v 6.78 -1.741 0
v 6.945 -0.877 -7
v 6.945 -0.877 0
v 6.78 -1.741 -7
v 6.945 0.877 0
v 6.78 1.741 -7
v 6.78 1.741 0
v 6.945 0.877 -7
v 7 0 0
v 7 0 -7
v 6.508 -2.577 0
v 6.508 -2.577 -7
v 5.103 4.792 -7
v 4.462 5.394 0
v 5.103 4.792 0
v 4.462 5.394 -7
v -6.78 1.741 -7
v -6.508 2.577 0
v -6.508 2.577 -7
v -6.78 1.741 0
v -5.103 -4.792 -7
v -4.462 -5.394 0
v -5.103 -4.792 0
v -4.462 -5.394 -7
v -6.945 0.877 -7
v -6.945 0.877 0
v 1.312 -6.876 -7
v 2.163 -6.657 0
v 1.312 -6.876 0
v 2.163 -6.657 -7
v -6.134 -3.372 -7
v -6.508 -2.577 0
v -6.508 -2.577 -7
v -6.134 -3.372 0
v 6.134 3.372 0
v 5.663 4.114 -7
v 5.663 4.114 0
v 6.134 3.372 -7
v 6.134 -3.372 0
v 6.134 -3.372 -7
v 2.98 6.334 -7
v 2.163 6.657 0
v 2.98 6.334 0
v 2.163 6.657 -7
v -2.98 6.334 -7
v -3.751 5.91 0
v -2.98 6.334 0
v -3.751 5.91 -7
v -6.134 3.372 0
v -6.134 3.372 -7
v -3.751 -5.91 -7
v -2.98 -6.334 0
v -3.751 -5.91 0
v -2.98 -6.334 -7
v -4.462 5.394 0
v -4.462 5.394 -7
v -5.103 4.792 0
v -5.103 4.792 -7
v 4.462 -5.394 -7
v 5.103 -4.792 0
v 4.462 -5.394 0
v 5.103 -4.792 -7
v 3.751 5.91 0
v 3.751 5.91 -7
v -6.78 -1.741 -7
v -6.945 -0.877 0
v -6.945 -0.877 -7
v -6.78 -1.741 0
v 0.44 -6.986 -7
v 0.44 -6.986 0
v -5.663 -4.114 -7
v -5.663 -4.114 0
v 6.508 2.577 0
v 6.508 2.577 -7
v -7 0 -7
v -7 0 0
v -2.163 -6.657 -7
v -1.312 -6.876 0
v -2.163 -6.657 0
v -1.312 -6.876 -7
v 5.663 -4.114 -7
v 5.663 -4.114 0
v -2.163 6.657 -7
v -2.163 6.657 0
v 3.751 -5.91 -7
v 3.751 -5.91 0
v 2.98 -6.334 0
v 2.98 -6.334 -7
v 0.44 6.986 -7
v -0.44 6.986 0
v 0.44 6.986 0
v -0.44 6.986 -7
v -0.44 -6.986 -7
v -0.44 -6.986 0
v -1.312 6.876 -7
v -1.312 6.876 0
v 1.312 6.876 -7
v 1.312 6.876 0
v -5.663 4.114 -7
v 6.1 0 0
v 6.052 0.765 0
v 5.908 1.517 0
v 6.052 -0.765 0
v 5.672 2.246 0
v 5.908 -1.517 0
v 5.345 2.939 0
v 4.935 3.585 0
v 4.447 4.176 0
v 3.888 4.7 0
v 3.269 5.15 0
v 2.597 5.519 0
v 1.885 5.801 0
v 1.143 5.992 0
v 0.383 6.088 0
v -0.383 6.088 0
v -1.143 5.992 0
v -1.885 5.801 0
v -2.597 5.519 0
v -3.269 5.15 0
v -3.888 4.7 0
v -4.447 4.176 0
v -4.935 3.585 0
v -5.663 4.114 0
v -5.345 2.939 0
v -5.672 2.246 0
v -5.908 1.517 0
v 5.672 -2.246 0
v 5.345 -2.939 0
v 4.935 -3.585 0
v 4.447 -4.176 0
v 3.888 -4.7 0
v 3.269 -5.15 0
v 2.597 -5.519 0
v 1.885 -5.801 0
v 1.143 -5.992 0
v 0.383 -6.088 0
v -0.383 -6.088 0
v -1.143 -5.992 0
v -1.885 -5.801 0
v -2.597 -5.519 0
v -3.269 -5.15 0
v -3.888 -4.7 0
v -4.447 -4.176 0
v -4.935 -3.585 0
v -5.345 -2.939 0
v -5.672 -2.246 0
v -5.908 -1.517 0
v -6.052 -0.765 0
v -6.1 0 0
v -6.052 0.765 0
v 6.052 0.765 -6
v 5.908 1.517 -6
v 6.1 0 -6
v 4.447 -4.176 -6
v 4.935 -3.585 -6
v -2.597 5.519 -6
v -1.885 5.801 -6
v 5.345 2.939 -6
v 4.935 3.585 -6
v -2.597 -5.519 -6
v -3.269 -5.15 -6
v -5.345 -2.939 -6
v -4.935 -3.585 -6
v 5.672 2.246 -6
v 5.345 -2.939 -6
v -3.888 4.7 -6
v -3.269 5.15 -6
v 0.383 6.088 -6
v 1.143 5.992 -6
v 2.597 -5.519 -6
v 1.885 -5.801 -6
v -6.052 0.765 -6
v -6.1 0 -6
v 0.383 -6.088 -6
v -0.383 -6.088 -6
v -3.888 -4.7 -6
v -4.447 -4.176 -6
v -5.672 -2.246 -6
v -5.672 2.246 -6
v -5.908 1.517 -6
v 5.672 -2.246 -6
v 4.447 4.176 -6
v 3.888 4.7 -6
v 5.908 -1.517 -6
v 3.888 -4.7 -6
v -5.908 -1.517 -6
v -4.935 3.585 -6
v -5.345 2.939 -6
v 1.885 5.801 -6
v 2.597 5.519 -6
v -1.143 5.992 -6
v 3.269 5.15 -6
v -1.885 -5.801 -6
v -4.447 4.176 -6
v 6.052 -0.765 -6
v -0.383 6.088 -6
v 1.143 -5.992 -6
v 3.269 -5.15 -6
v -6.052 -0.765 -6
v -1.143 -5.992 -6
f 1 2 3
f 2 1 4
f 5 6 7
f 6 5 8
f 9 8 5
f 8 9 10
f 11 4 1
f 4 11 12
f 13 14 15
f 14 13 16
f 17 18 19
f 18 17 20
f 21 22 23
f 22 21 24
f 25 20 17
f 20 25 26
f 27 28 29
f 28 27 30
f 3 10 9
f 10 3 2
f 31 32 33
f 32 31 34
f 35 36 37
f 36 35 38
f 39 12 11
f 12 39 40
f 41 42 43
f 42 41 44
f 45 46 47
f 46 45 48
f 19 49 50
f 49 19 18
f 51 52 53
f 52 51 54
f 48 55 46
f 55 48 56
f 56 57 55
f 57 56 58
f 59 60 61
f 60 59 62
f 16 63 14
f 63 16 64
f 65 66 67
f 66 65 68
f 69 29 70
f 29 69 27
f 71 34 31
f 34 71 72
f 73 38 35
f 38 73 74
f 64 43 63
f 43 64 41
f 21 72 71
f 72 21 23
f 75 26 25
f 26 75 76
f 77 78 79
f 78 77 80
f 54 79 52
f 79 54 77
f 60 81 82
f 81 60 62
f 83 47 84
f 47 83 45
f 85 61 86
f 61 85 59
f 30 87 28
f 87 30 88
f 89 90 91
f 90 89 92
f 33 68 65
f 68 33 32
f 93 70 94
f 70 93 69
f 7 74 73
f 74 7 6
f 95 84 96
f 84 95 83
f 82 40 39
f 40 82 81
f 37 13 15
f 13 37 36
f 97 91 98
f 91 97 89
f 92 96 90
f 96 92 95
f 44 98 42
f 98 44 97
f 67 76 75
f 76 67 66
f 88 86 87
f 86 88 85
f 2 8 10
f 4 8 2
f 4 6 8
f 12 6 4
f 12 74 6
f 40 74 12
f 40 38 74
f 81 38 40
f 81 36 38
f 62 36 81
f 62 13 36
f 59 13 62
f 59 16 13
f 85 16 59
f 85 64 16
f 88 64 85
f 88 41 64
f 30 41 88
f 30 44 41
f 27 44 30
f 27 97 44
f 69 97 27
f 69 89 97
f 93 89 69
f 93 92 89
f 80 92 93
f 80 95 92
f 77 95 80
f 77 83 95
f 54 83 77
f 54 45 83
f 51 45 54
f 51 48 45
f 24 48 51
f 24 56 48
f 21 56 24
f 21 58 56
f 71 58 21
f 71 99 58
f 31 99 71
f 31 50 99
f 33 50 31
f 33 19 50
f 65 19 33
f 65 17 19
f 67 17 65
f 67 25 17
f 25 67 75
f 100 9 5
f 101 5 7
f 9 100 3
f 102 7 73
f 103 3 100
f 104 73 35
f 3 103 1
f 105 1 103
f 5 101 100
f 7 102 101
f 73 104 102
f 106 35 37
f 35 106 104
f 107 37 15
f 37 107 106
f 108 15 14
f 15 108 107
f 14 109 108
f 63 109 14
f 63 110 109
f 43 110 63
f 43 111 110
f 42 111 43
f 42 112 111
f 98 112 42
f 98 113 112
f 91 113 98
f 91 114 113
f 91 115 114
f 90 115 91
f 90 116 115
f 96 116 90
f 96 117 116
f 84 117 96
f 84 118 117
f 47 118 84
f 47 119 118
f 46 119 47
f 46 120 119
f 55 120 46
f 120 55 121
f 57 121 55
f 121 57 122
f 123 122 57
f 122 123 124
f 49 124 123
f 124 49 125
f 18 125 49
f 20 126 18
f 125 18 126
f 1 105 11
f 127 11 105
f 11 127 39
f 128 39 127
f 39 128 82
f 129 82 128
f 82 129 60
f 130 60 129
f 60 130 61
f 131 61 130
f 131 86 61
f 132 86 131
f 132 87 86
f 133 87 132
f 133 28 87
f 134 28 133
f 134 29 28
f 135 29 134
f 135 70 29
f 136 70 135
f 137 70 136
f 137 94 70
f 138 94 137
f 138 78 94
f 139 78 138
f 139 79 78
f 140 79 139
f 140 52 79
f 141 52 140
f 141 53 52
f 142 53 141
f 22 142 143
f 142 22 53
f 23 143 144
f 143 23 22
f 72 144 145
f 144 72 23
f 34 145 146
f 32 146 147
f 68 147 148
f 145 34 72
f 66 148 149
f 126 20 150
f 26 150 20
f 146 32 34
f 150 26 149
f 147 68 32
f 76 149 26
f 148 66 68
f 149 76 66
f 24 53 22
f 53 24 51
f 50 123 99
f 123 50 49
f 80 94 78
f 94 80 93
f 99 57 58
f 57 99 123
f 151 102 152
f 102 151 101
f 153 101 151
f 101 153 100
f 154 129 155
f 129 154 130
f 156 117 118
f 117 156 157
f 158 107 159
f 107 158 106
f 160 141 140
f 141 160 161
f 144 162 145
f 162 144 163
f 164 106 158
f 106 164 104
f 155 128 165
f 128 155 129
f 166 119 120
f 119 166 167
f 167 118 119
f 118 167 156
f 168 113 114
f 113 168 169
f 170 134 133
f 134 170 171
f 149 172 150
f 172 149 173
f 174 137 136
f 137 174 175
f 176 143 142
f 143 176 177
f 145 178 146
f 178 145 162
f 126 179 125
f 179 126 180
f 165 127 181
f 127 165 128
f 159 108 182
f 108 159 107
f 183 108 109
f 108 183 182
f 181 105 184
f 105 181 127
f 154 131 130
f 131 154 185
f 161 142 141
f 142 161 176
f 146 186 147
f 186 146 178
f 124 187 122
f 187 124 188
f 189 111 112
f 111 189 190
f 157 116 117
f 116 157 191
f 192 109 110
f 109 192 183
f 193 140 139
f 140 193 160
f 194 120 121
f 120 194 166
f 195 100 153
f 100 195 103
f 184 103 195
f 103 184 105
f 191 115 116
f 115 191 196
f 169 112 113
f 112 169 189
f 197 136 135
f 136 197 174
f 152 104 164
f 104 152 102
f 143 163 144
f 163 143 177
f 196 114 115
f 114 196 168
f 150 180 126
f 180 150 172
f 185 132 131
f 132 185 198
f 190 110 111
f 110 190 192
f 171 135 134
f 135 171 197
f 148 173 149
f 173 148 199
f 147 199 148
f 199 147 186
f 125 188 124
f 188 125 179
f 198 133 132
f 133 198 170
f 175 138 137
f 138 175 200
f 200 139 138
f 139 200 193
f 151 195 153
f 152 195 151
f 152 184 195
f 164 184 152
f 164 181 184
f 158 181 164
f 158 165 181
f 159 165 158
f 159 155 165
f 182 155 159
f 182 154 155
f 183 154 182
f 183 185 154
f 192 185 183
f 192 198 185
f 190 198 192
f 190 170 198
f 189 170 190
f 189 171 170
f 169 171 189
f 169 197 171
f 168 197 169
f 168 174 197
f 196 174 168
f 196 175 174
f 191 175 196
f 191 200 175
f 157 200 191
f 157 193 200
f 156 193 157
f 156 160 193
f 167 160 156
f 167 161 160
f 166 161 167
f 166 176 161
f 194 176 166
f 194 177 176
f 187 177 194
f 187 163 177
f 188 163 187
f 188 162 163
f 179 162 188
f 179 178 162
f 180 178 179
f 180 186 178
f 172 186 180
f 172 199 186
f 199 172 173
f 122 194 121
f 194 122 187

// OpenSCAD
$fn = 50;


difference() {
	union() {
		translate(v = [0, 0, -7.0000000000]) {
			cylinder(h = 7, r = 7.0000000000);
		}
	}
	union() {
		#translate(v = [0, 0, -6.0000000000]) {
			cylinder(h = 6, r = 6.1000000000);
		}
	}
}
